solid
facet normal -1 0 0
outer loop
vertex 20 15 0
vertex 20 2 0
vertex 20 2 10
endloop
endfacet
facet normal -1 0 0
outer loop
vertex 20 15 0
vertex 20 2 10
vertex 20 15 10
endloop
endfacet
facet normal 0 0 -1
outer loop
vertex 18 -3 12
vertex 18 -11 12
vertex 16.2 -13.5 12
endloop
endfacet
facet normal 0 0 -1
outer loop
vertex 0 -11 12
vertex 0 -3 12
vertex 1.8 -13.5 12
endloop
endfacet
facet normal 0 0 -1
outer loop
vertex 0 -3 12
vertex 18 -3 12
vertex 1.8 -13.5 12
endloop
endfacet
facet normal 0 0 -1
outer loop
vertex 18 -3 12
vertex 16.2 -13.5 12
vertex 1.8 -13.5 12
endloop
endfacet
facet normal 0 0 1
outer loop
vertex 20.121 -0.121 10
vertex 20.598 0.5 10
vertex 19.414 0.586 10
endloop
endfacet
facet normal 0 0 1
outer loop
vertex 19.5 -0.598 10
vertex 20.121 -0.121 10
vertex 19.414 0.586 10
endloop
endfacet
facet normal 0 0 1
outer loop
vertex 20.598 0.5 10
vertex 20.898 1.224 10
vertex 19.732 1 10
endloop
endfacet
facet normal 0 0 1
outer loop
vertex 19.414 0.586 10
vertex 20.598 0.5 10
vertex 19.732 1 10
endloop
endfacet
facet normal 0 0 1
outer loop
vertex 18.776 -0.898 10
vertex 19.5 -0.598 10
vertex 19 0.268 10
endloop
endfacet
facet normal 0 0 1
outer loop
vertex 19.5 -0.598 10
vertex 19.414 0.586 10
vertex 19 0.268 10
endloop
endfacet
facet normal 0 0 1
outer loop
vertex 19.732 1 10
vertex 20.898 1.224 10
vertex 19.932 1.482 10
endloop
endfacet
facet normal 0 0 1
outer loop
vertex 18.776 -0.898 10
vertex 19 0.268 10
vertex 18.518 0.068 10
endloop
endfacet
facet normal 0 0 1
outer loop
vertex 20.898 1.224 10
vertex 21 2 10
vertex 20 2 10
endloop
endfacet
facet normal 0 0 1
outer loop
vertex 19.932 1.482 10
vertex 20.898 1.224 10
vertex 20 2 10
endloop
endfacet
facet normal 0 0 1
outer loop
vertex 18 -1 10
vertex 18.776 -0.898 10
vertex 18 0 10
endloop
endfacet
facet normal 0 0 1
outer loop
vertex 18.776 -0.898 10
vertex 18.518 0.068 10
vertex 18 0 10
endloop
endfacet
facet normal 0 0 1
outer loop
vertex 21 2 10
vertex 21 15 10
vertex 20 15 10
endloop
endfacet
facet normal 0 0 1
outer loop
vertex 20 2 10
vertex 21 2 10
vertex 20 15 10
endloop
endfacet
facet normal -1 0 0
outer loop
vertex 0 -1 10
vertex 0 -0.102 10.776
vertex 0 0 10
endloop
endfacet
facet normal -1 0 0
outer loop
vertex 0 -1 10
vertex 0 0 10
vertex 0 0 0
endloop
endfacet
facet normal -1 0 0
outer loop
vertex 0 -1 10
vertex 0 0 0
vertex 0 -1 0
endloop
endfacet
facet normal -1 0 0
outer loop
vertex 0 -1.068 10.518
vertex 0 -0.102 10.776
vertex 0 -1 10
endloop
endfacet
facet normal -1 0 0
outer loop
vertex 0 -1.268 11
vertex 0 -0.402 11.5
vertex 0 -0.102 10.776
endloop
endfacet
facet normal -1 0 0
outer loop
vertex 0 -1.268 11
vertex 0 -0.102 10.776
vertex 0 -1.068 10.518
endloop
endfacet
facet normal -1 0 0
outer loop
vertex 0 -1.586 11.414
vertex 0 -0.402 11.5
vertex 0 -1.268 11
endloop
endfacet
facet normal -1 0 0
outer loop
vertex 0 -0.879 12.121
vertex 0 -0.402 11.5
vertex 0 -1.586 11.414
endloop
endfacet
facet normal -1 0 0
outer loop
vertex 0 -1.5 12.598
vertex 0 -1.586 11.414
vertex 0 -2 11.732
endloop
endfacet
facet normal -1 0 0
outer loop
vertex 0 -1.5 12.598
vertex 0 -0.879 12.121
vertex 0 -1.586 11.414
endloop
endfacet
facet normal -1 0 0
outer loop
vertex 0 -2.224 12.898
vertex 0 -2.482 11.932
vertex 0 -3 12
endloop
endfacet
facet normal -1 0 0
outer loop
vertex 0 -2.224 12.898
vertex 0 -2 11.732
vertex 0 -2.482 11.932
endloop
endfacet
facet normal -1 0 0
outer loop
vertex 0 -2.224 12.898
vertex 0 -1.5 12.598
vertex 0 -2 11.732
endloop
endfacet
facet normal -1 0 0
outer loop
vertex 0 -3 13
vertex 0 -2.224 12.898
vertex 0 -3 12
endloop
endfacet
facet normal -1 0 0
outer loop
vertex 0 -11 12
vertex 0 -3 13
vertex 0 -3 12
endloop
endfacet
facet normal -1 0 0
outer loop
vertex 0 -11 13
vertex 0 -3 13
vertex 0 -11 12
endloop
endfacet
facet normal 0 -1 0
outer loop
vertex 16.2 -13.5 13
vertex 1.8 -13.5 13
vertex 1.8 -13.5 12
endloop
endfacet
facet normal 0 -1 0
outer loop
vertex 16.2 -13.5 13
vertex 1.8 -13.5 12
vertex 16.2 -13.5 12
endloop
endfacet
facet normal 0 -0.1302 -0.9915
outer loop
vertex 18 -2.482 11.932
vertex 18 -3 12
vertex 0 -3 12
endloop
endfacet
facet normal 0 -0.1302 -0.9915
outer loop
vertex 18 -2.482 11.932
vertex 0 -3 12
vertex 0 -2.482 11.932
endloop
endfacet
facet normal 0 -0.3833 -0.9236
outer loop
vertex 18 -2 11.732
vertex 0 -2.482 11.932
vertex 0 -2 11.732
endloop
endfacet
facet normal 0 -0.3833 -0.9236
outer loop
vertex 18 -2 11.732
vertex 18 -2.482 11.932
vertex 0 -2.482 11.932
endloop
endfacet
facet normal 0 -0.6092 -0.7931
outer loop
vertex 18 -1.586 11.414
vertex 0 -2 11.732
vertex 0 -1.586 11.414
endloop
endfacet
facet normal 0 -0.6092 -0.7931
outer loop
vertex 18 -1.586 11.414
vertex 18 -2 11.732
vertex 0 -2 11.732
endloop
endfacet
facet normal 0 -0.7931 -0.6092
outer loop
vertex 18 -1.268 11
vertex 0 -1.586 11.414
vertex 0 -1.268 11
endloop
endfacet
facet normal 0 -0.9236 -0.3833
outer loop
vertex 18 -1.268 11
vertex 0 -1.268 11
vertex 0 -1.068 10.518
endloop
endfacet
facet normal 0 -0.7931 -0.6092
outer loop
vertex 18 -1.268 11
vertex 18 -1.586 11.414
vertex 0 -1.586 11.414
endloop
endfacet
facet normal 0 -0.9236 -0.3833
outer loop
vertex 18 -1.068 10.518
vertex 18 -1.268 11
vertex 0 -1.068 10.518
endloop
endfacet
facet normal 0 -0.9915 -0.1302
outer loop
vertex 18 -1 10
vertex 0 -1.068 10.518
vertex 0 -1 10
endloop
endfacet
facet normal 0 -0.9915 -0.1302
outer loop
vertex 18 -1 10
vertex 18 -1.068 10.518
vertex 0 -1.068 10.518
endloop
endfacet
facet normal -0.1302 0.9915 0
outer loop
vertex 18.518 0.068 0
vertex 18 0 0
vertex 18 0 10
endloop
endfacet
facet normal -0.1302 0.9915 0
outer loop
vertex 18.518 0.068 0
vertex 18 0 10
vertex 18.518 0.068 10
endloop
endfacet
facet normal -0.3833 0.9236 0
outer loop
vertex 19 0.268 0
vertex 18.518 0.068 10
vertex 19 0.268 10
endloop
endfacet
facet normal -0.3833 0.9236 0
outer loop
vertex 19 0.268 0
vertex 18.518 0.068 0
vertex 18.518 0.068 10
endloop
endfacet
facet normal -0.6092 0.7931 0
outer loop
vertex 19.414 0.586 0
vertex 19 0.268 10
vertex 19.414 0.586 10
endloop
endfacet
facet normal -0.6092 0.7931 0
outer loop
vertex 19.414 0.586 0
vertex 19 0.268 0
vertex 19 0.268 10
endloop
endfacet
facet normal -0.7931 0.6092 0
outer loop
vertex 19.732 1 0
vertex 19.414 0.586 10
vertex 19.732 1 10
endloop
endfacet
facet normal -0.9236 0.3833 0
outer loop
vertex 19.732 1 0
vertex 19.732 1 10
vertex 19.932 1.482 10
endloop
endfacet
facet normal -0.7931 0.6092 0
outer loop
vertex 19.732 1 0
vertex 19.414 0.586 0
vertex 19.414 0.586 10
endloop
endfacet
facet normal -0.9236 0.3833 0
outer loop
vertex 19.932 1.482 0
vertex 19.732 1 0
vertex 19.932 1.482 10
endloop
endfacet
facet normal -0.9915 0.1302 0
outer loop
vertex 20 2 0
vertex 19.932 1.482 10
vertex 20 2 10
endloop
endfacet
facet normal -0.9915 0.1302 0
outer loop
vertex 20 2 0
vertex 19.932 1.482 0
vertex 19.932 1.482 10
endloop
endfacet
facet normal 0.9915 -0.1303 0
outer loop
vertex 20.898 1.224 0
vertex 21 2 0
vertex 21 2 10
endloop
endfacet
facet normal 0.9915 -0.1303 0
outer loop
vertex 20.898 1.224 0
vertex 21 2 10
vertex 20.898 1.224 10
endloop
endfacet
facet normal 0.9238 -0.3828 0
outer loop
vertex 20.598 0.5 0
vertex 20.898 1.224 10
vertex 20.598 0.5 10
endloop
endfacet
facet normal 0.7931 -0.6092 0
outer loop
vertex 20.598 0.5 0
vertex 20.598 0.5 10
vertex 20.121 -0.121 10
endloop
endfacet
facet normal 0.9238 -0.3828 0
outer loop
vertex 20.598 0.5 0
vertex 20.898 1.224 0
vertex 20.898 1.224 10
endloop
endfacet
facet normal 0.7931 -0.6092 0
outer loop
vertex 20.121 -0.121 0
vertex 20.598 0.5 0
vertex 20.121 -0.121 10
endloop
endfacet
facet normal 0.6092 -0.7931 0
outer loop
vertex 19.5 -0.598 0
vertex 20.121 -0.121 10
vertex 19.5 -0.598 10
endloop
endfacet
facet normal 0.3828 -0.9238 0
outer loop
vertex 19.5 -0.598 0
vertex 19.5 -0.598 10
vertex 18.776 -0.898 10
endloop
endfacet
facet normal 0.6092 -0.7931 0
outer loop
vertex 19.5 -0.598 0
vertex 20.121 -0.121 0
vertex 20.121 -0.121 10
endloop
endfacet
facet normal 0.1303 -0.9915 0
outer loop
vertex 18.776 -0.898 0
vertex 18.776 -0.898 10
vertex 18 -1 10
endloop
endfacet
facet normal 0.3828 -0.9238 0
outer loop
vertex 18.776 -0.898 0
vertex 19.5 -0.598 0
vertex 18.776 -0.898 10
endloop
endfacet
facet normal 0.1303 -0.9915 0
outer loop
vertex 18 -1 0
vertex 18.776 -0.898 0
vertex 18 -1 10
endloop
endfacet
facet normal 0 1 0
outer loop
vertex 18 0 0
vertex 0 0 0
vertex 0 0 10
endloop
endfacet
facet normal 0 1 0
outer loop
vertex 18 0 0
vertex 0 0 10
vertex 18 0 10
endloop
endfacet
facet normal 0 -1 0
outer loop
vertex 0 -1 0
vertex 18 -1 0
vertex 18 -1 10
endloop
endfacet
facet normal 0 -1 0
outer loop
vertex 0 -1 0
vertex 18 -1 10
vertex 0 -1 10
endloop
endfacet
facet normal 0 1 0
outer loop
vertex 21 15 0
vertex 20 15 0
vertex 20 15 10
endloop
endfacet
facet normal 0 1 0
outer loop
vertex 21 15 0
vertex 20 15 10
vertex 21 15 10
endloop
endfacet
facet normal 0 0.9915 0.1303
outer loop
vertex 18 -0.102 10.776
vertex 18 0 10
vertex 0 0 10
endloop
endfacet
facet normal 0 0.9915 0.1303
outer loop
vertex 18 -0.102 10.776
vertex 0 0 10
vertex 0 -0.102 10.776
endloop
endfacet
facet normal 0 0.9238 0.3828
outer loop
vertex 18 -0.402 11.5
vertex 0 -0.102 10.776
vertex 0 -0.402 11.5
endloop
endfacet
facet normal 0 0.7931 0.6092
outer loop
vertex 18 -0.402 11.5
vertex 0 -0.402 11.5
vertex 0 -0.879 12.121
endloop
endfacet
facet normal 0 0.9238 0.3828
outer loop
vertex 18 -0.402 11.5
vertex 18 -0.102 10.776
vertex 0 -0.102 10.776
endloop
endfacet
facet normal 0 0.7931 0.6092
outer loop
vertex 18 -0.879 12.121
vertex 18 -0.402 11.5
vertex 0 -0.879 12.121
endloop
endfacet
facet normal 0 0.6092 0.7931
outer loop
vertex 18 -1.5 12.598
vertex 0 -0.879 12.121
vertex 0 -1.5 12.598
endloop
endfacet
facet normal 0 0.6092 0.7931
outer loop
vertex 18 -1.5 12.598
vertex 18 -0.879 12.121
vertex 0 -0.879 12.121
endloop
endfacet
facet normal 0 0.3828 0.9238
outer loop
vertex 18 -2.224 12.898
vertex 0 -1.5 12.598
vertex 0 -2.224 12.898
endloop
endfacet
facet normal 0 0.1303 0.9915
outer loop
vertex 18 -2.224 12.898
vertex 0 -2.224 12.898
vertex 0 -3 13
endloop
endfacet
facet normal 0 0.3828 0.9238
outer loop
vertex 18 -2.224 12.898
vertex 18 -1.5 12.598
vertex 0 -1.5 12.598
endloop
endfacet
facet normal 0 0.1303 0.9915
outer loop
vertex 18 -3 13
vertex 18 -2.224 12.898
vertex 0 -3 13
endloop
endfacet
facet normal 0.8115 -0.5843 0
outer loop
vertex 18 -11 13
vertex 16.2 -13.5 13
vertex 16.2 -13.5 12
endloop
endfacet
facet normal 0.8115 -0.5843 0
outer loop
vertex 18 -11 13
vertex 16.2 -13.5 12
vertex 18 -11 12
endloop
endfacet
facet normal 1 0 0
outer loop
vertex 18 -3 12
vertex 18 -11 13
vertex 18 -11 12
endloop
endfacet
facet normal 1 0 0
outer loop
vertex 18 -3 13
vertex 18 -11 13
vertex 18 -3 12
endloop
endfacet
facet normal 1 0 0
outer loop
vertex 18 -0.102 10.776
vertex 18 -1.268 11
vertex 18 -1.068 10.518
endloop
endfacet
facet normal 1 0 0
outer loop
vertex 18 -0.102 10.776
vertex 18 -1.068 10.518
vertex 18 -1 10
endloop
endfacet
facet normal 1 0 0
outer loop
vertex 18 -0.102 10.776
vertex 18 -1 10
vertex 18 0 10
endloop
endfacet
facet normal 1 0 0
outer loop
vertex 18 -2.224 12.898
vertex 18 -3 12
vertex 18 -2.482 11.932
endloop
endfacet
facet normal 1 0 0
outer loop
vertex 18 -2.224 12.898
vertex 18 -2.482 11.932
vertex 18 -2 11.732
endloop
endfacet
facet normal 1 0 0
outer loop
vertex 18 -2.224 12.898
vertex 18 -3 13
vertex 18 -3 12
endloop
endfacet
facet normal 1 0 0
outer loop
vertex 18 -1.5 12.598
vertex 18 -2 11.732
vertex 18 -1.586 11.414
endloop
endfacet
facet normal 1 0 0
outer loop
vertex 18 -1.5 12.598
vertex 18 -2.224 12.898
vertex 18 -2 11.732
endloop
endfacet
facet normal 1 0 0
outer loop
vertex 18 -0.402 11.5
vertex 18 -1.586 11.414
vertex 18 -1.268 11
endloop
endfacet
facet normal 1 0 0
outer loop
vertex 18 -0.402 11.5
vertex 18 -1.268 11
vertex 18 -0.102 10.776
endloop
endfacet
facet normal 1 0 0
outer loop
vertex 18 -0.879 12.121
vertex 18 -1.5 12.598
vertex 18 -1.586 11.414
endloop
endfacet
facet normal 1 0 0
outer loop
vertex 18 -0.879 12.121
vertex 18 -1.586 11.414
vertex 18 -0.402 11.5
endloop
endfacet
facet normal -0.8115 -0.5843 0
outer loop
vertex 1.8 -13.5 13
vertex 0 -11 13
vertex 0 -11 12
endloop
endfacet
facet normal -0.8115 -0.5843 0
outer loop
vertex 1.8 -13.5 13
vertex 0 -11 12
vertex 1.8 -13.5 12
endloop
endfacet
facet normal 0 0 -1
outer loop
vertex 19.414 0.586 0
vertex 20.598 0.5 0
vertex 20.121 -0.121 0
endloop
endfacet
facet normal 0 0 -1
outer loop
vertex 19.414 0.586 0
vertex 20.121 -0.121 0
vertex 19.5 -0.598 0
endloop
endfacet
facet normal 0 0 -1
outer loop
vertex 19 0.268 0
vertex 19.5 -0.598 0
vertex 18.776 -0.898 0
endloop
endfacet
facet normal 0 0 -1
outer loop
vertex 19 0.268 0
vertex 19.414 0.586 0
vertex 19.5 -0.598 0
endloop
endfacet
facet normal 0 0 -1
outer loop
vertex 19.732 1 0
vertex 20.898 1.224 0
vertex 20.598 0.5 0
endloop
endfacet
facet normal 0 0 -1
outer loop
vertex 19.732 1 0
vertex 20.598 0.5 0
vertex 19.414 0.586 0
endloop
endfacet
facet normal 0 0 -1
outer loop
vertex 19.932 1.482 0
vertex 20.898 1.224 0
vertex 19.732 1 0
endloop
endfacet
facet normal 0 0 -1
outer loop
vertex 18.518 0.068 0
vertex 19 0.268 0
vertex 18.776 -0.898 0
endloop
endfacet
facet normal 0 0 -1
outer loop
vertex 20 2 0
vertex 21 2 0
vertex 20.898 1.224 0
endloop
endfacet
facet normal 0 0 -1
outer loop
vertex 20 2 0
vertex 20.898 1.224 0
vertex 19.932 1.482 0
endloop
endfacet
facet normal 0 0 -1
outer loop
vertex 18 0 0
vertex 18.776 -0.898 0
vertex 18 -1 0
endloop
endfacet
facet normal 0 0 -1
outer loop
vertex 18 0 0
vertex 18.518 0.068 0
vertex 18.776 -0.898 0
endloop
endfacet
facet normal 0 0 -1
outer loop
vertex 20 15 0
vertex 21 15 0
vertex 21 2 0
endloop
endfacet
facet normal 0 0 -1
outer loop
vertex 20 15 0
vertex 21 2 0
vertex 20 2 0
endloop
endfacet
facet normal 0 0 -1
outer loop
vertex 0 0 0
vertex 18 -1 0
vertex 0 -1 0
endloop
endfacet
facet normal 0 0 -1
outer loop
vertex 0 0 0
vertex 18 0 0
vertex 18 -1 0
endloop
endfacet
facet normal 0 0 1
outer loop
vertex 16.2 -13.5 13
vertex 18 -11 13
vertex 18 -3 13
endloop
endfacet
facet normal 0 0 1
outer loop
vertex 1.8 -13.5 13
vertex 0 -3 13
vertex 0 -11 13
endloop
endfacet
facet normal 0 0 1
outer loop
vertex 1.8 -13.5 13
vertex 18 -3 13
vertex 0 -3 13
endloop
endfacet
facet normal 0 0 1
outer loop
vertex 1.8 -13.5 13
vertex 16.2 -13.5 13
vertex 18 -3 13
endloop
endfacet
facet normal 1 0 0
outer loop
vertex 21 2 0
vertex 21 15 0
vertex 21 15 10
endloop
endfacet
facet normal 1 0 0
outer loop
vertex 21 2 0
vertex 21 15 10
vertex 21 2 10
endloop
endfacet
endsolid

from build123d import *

# Parameters (mm, degrees)
SM_BASE_FLANGE_1_DEPTH      = 10
SM_EDGE_FLANGE_2_DEPTH      = 18
SM_START                    = 1
SM_EDGE_FLANGE_2_FLAT_DEPTH = 1


# Sheet-metal steps are written as plain solids
with BuildPart() as part:
    # Sketch 1 → 基体-法兰1 (new body)
    with BuildSketch(Plane.XY):
        with BuildLine():
            Line((0, 0), (18, 0))
            ThreePointArc((18, 0), (19.414213562, 0.585786438), (20, 2))
            Line((20, 2), (20, 15))
            Line((20, 15), (21, 15))
            Line((21, 15), (21, 2))
            ThreePointArc((21, 2), (20.121320344, -0.121320344), (18, -1))
            Line((18, -1), (0, -1))
            Line((0, -1), (0, 0))
        make_face()
    extrude(amount=SM_BASE_FLANGE_1_DEPTH)

    # 边线-法兰2 bend section (across the edge) → 边线-法兰2 (add)
    with BuildSketch(Plane(origin=(18, -1, 12), x_dir=(0, 0, -1), z_dir=(-1, 0, 0))):
        with BuildLine():
            Line((-1, 2), (0, 2))
            ThreePointArc((0, 2), (0.585786438, 0.585786438), (2, 0))
            Line((2, 0), (2, -1))
            ThreePointArc((2, -1), (-0.121320344, -0.121320344), (-1, 2))
        make_face()
    extrude(amount=SM_EDGE_FLANGE_2_DEPTH)

    # 边线-法兰2 profile (on flange) → 边线-法兰2 flat (add)
    with BuildSketch(Plane(origin=(0, -1, 12), x_dir=(-1, 0, 0), z_dir=(0, 0, 1)).offset(SM_START)):
        Polygon((0, 2), (0, 10), (-1.8, 12.5), (-16.2, 12.5), (-18, 10), (-18, 2), align=None)
    extrude(amount=-SM_EDGE_FLANGE_2_FLAT_DEPTH)


solid = part.part
